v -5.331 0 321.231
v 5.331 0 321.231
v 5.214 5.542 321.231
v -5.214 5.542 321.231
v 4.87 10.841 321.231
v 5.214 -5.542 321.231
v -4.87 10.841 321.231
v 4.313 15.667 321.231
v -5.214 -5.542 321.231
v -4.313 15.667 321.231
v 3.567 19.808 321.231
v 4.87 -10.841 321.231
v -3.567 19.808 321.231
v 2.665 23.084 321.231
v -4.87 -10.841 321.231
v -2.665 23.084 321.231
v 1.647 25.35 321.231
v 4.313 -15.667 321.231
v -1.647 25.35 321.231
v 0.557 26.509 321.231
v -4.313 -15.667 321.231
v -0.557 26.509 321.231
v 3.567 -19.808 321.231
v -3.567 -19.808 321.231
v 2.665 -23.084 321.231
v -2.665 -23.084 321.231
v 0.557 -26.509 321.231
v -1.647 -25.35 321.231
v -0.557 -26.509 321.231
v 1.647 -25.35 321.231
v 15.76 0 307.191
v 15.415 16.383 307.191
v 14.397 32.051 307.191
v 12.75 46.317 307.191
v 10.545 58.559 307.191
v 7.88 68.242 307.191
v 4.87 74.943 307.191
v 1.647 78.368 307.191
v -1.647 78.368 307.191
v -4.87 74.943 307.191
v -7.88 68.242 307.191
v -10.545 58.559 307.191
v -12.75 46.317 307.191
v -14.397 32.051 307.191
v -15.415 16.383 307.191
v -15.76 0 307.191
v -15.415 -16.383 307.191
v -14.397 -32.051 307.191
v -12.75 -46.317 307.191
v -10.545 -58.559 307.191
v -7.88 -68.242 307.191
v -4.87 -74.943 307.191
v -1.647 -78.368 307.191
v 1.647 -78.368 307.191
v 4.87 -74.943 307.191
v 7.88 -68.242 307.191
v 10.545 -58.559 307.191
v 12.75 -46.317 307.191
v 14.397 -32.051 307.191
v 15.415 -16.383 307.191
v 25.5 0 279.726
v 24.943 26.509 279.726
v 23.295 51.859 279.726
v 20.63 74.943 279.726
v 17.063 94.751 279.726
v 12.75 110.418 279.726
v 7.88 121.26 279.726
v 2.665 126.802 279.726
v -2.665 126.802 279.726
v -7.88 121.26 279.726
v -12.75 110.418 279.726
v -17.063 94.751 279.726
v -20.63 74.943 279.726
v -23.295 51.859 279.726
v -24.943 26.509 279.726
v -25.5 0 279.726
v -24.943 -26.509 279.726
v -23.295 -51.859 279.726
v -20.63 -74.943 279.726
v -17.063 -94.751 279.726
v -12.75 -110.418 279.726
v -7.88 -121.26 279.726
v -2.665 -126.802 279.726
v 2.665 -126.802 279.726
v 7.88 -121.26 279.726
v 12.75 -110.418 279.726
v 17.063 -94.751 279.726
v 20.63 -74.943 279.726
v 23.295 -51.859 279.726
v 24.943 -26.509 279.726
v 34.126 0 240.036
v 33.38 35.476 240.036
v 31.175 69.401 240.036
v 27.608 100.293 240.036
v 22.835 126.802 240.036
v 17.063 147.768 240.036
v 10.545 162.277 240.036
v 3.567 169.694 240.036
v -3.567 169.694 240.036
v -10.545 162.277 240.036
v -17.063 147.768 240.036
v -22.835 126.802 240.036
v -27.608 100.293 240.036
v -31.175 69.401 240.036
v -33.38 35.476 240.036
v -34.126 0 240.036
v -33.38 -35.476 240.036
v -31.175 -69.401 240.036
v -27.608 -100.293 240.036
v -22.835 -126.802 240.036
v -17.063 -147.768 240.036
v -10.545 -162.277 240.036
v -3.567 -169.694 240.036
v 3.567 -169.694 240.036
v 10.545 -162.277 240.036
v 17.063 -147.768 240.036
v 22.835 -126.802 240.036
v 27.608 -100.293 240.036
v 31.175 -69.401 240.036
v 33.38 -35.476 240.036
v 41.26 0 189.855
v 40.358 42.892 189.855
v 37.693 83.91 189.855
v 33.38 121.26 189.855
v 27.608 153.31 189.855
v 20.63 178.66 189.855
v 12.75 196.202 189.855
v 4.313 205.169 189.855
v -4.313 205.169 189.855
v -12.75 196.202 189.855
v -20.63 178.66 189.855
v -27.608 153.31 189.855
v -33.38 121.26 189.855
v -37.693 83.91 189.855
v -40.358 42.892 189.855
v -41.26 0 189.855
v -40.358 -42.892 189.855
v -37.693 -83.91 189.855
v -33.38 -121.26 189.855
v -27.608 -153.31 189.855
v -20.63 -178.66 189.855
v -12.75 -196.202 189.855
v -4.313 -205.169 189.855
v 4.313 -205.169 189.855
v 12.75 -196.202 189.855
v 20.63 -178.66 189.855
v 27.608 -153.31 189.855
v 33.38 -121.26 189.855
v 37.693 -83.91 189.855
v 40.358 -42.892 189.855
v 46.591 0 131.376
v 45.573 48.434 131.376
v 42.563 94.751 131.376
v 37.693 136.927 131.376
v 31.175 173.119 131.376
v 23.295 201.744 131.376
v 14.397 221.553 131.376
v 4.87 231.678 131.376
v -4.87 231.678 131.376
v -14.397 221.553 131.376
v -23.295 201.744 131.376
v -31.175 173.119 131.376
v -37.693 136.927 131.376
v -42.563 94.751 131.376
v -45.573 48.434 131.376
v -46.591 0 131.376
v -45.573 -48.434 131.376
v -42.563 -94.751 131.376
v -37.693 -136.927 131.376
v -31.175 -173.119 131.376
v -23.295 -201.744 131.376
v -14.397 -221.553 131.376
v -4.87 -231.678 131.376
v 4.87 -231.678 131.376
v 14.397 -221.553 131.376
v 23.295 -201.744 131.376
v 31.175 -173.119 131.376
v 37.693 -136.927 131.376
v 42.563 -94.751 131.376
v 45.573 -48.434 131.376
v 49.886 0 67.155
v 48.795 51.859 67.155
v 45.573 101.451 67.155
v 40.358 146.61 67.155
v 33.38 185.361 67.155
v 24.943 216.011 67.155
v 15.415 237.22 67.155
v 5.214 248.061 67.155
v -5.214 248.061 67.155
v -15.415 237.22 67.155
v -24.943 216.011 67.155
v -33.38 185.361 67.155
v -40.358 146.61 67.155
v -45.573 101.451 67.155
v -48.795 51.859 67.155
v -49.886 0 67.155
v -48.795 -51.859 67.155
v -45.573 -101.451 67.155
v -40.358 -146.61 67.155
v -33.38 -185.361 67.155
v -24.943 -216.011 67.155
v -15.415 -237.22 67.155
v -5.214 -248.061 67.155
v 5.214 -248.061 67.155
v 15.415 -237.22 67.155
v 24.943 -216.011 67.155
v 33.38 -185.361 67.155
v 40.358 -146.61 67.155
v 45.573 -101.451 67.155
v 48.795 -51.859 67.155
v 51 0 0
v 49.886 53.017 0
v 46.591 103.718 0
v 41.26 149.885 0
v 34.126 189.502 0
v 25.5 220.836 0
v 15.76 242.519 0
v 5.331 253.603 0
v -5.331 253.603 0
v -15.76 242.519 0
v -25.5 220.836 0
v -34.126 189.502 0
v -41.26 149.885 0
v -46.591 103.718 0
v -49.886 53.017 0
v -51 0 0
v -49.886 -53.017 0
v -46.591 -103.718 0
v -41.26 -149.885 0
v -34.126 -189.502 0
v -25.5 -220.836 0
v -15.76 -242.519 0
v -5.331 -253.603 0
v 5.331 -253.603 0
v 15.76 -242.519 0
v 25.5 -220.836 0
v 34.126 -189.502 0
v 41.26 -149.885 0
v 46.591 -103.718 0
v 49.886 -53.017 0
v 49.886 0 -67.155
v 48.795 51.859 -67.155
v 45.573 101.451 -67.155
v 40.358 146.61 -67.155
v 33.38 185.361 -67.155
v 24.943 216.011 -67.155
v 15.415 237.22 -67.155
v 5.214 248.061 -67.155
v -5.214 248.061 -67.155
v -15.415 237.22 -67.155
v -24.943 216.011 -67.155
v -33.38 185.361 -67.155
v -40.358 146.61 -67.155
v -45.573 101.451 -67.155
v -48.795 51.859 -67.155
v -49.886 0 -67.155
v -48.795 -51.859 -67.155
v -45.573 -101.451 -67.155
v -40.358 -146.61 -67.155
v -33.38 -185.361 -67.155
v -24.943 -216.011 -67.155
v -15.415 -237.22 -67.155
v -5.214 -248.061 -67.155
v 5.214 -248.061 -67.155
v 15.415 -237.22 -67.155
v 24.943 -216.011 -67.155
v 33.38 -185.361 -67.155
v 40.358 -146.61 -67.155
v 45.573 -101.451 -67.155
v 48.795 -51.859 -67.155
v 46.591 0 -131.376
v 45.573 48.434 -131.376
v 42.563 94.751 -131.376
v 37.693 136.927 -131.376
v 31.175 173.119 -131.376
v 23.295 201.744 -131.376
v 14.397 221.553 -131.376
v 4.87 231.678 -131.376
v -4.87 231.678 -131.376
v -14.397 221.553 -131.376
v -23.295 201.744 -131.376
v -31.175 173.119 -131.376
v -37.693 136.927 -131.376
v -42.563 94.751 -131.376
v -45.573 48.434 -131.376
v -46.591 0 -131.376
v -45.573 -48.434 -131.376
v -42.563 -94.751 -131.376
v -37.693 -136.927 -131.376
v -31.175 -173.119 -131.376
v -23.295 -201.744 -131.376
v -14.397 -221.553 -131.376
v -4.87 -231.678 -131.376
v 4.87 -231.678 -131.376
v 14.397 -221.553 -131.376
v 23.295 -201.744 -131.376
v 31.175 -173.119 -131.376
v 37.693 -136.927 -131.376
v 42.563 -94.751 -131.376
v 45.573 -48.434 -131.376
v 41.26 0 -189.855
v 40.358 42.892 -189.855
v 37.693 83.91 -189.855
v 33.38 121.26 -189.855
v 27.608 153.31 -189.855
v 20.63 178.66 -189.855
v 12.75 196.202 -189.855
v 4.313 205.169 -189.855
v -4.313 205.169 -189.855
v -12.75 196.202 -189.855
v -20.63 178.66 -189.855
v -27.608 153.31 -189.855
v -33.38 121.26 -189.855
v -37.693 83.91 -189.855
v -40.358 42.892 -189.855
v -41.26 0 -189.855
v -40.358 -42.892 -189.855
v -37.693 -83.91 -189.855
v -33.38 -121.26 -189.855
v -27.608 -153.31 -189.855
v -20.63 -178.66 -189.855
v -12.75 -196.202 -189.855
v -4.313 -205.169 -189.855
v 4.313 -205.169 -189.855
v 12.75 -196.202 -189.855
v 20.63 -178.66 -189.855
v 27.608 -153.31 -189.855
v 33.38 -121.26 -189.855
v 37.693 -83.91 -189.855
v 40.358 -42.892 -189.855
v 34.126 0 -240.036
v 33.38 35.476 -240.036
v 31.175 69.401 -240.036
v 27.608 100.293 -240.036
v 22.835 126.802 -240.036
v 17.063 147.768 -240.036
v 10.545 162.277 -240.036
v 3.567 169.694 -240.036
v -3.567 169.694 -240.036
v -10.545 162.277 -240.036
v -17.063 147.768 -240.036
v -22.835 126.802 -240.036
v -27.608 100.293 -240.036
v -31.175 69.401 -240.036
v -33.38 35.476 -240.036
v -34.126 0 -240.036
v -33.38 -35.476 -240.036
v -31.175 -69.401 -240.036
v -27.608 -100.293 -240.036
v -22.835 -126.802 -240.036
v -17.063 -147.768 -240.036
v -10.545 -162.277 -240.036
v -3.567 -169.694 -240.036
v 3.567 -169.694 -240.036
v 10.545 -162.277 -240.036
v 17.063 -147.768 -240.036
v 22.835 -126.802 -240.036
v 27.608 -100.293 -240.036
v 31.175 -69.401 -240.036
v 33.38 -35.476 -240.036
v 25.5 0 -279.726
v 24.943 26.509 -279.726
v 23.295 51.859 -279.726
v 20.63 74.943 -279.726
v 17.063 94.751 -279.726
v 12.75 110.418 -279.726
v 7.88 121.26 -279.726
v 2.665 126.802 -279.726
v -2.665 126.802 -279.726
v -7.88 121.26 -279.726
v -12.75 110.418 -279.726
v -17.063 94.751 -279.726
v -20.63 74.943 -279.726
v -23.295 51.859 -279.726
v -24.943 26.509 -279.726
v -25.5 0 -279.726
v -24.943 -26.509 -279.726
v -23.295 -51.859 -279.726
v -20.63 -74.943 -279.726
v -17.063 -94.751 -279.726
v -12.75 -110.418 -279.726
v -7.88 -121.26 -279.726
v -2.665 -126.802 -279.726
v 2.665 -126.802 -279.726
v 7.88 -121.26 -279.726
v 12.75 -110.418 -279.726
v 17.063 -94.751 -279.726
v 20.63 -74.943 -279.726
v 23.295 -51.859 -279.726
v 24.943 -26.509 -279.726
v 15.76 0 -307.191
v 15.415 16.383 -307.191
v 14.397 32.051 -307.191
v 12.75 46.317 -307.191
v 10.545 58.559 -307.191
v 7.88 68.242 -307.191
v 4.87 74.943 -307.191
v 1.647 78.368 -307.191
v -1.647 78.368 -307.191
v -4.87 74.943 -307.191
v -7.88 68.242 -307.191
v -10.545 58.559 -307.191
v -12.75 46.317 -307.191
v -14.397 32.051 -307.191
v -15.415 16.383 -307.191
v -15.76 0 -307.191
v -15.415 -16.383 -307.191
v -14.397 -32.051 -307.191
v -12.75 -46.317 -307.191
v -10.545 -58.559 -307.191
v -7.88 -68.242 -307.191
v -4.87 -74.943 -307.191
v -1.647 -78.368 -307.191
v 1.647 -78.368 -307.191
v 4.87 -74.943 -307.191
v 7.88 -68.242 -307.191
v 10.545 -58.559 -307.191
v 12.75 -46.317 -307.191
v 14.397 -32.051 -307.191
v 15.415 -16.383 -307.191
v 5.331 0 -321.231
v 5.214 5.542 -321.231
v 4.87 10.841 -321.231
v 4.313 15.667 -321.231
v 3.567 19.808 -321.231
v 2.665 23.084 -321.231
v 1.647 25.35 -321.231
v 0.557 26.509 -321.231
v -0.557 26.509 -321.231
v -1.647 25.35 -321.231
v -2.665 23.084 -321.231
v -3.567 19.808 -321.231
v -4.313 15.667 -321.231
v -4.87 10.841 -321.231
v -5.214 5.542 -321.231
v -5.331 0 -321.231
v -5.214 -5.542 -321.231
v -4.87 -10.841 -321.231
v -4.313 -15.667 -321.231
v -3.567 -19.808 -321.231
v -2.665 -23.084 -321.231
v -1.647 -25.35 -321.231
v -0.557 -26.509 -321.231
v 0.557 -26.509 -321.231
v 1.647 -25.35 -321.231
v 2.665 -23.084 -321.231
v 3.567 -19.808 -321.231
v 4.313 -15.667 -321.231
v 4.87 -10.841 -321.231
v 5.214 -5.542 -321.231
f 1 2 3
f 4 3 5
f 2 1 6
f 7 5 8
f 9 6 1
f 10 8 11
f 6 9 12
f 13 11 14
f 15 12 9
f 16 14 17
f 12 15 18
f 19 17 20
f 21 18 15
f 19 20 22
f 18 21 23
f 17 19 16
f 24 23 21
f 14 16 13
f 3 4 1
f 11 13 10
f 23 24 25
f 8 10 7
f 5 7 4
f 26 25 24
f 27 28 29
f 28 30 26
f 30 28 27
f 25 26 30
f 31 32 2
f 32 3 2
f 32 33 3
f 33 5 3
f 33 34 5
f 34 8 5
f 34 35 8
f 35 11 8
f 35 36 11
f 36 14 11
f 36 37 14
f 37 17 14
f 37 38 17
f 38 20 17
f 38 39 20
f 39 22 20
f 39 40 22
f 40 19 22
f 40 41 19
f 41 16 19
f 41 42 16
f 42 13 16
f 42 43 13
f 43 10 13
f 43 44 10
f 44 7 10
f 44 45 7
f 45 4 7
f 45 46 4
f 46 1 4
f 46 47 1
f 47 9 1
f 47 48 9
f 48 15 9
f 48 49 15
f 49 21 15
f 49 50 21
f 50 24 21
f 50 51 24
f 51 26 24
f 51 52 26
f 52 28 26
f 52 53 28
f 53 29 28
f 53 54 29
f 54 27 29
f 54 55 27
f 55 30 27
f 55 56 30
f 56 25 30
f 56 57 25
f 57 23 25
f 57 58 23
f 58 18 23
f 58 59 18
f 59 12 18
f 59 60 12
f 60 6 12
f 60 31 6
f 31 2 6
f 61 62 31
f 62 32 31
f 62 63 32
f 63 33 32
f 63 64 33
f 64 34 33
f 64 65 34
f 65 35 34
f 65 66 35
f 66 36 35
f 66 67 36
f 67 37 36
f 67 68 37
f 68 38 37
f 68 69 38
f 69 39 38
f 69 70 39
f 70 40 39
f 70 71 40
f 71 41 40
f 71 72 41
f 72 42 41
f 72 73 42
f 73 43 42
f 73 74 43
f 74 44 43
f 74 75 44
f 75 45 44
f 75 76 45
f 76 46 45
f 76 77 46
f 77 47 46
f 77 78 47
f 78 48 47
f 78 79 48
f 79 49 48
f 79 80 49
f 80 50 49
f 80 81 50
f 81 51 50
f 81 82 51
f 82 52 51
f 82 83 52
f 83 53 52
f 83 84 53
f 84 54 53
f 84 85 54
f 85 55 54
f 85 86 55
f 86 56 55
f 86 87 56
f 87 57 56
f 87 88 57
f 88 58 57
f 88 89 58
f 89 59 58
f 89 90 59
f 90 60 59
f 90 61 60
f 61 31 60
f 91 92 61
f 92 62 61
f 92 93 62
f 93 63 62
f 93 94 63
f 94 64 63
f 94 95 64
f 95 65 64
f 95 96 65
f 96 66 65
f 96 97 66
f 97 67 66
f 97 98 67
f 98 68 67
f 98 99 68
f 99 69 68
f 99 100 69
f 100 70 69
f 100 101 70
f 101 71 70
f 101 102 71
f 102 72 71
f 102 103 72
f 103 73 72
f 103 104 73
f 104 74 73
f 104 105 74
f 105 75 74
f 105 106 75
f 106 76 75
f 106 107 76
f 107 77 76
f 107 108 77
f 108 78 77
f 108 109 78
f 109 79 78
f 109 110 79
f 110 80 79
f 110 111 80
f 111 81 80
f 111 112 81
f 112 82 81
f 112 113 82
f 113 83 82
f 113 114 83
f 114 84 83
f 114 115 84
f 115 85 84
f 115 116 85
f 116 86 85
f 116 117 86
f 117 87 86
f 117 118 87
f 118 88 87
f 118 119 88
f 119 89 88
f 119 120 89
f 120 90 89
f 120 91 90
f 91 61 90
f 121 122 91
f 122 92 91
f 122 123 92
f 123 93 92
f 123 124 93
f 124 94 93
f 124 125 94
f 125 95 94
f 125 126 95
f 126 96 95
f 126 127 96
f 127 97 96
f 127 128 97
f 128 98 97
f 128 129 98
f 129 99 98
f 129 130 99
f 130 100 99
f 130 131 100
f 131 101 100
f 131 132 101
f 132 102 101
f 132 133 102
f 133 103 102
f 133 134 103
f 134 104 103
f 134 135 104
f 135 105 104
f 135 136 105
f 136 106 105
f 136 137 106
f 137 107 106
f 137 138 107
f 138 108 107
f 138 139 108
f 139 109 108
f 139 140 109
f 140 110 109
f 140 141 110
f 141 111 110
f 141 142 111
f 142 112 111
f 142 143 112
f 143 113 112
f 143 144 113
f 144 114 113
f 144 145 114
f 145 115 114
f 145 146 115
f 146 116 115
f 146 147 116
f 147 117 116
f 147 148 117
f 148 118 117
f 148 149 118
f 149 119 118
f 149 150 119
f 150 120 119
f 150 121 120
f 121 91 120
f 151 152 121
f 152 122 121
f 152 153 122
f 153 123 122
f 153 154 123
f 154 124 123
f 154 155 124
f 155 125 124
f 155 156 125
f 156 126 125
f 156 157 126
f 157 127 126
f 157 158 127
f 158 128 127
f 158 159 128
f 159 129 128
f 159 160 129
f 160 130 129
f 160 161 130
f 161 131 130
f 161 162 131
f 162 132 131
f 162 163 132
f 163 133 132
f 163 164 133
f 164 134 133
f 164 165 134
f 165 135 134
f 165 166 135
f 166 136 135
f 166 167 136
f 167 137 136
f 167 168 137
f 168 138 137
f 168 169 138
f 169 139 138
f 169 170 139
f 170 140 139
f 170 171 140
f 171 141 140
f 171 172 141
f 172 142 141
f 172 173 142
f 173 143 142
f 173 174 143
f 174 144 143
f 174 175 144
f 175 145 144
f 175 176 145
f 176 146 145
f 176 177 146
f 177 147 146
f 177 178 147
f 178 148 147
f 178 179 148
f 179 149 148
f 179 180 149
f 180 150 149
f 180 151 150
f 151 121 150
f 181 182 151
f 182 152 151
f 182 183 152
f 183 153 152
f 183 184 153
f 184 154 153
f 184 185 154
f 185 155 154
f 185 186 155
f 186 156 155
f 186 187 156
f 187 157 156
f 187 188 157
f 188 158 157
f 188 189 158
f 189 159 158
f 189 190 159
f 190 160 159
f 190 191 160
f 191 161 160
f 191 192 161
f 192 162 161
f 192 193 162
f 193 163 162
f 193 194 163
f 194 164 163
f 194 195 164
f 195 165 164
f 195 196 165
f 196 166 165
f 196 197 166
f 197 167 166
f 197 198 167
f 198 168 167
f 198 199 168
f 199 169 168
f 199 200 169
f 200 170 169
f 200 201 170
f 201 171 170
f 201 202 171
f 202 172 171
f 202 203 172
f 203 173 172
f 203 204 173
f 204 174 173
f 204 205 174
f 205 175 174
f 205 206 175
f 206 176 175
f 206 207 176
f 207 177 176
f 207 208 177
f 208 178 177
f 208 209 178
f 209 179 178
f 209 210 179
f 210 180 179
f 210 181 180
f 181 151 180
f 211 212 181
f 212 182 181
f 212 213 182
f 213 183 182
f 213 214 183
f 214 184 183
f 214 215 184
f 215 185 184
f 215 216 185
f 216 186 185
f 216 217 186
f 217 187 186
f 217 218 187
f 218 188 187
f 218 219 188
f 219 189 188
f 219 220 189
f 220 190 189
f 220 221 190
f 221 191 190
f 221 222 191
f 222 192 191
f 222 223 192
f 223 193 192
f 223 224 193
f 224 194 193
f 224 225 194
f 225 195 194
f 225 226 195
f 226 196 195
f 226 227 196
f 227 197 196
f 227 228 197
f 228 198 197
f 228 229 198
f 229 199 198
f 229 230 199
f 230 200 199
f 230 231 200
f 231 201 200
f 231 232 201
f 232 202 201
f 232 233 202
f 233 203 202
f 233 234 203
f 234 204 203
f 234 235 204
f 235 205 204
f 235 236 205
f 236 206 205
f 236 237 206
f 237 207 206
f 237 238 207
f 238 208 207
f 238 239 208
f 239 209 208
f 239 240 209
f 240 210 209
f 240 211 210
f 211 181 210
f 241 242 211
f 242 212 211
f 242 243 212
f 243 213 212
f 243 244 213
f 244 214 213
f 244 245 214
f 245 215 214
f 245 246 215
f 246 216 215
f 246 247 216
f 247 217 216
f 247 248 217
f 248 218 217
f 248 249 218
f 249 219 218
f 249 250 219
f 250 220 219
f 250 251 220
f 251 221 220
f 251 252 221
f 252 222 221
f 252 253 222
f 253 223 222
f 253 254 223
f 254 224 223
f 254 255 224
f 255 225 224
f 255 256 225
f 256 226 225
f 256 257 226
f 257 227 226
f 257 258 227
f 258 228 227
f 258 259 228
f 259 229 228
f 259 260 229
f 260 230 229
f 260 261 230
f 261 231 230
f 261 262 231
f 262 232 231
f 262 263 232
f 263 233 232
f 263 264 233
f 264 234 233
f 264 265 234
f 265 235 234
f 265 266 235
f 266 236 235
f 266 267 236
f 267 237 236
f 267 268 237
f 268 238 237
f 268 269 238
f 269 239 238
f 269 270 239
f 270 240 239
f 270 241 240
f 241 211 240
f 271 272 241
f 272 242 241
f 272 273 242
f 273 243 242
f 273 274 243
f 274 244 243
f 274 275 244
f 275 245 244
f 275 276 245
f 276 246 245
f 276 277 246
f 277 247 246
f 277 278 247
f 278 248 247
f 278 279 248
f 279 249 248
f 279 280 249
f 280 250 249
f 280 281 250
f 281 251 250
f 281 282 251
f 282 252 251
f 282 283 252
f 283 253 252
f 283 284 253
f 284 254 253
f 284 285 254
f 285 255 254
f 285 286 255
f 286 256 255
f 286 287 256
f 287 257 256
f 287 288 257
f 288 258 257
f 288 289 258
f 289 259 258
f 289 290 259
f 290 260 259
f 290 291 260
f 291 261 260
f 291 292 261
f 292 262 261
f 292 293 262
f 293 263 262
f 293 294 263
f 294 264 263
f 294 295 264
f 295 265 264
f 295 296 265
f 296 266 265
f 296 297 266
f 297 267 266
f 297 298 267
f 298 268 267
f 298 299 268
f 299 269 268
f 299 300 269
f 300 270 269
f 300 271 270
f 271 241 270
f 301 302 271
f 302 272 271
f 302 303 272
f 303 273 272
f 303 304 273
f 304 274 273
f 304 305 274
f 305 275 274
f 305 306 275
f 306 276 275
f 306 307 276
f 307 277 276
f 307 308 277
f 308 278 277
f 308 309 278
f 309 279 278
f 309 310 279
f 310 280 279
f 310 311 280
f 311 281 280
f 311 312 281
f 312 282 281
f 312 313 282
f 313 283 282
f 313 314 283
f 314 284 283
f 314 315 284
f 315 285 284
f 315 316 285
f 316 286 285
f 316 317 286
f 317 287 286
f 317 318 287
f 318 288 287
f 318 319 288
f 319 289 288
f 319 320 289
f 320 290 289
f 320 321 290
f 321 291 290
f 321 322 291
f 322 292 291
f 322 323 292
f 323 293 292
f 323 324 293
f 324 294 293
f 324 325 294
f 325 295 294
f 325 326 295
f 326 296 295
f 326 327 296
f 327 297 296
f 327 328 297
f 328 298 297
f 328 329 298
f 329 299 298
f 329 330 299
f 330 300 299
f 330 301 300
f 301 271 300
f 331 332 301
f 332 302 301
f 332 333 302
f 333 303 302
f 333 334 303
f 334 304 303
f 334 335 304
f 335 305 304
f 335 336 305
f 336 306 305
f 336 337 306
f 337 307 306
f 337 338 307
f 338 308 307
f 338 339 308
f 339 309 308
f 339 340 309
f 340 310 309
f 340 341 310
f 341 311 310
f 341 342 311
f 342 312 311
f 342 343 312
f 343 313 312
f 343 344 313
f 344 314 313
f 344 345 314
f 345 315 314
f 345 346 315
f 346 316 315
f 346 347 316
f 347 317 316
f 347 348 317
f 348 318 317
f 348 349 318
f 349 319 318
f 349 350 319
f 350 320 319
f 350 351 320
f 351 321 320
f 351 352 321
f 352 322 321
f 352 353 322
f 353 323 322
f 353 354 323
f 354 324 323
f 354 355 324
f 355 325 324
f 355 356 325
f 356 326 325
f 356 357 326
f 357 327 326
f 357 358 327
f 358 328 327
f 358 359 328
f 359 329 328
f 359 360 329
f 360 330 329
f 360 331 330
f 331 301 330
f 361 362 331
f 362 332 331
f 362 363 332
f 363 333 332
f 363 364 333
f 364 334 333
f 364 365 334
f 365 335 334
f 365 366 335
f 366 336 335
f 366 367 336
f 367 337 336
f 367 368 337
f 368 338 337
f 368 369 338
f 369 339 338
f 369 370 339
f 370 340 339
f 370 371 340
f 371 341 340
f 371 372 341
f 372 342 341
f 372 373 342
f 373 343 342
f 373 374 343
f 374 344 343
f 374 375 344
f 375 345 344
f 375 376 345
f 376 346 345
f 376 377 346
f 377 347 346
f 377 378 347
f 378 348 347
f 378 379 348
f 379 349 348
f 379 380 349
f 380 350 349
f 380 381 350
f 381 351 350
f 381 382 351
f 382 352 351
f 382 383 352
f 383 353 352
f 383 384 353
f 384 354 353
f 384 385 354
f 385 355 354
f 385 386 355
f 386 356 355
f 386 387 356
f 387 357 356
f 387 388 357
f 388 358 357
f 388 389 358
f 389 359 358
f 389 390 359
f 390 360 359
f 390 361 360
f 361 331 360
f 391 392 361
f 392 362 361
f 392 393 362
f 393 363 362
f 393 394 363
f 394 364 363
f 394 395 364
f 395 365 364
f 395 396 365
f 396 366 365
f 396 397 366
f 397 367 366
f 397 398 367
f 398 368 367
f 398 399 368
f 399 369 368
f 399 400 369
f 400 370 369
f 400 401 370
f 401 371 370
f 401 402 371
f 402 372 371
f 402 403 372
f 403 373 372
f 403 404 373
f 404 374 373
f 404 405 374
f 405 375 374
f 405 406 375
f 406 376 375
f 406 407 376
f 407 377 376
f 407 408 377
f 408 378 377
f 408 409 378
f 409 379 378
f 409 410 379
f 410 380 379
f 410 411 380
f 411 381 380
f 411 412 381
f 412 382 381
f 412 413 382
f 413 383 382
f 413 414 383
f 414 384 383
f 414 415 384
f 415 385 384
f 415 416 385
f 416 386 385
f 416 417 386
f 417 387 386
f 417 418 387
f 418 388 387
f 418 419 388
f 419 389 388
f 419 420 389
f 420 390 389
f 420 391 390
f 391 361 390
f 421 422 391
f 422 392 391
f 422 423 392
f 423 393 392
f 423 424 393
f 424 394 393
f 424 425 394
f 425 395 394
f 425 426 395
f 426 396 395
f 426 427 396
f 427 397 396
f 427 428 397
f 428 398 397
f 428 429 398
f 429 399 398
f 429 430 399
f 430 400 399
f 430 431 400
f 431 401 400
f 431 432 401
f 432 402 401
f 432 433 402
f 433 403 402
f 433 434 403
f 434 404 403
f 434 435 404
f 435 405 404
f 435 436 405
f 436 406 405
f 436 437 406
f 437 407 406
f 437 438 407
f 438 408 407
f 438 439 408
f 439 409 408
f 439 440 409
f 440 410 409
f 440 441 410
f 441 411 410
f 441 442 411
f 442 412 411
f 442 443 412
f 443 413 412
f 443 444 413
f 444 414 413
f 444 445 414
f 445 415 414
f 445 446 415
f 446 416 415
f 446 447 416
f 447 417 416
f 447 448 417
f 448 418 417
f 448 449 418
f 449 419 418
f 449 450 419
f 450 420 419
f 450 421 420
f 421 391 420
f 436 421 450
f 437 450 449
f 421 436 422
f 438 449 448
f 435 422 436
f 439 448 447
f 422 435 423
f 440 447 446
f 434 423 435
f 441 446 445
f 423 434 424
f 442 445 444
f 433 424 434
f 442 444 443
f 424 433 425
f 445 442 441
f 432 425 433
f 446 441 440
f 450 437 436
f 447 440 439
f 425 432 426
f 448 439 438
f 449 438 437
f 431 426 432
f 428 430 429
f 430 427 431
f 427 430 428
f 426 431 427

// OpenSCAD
// Generated by SolidPython 1.0.1 on 2020-07-29 00:46:45


scale(v = [3, 15, 19]) {
	sphere(r = 17);
}
/***********************************************
*********      SolidPython code:      **********
************************************************
 
# import packages: SolidPython
from solid import *
from solid.utils import *
from itertools import chain, combinations, permutations


class Resize:

    def __init__(self, scad_file):
        self.scad_file = scad_file
        #self.scad_file = import_scad(scad_file)
        # cone/cylinder param:
        self.r1 = 0
        self.r2 = 0
        self.h = 0
        # rectangular prism param:
        self.w = 0
        self.l = 0
        # ellipse param:
        self.r = 0

    # import OpenScad code (file name corresponds to shape)


    # classify shape + parameters
    def assign(self, param1, param2, param3):
        if self.scad_file == 'cone.scad':
            self.r1 = param1
            self.r2 = param2
            self.h = param3
        elif self.scad_file == 'cylinder.scad':
            self.r1 = param1
            self.r2 = param2
            self.h = param3
        elif self.scad_file == 'rectangularPrism.scad':
            self.h = param1
            self.l = param2
            self.w = param3
        else:
            self.r = param1
            self.h = param2

    # resize parameters
    def iterate(self):
        x = range(3, 20, 2)
        i = 1
        if self.scad_file == 'cone.scad':
            tempList = list(permutations(x, 2))
            for temp in tempList:
                param1 = temp[0]
                param2 = temp[1]
                filepath = 'produced_scad_files/' + 'cone' + str(param1) + '_' + str(param2) + '_' + '.scad'
                scad_render_to_file(cylinder(h=param1, r1=param2, r2=0), filepath)

        elif self.scad_file == 'cylinder.scad':
            tempList = list(permutations(x, 3))
            for temp in tempList:
                param1 = temp[0]
                param2 = temp[1]
                filepath = 'produced_scad_files/' + 'cylinder' + str(param1) + '_' + str(param2) + '_' + '.scad'
                scad_render_to_file(cylinder(h=param1, r1=param2, r2=param2), filepath)

        elif self.scad_file == 'rectangularPrism.scad':
            tempList = list(permutations(x, 3))
            for temp in tempList:
                param1 = temp[0]
                param2 = temp[1]
                param3 = temp[2]
                filepath = 'produced_scad_files/' + 'rectangularPrism' + str(param1) + '_' + str(param2) + '_' + str(
                    param3) + '.scad'
                scad_render_to_file(cube(size=(param1, param2, param3)), filepath)

        elif self.scad_file == 'ellipse.scad':
            tempList = list(permutations(x, 4))
            for temp in tempList:
                param1 = temp[0]
                param2 = temp[1]
                param3 = temp[2]
                param4 = temp[3]
                filepath = 'produced_scad_files/' + 'ellipse' + str(param1) + '_' + str(param2) + '_' + str(param3) + '_' + str(param4) + '.scad'
                scad_render_to_file(scale([param1, param2, param3])(sphere(r=param4)), filepath)

    def render_to_scadfile(self):
        scad_render_to_file(scad, 'example.scad') 
 
************************************************/
